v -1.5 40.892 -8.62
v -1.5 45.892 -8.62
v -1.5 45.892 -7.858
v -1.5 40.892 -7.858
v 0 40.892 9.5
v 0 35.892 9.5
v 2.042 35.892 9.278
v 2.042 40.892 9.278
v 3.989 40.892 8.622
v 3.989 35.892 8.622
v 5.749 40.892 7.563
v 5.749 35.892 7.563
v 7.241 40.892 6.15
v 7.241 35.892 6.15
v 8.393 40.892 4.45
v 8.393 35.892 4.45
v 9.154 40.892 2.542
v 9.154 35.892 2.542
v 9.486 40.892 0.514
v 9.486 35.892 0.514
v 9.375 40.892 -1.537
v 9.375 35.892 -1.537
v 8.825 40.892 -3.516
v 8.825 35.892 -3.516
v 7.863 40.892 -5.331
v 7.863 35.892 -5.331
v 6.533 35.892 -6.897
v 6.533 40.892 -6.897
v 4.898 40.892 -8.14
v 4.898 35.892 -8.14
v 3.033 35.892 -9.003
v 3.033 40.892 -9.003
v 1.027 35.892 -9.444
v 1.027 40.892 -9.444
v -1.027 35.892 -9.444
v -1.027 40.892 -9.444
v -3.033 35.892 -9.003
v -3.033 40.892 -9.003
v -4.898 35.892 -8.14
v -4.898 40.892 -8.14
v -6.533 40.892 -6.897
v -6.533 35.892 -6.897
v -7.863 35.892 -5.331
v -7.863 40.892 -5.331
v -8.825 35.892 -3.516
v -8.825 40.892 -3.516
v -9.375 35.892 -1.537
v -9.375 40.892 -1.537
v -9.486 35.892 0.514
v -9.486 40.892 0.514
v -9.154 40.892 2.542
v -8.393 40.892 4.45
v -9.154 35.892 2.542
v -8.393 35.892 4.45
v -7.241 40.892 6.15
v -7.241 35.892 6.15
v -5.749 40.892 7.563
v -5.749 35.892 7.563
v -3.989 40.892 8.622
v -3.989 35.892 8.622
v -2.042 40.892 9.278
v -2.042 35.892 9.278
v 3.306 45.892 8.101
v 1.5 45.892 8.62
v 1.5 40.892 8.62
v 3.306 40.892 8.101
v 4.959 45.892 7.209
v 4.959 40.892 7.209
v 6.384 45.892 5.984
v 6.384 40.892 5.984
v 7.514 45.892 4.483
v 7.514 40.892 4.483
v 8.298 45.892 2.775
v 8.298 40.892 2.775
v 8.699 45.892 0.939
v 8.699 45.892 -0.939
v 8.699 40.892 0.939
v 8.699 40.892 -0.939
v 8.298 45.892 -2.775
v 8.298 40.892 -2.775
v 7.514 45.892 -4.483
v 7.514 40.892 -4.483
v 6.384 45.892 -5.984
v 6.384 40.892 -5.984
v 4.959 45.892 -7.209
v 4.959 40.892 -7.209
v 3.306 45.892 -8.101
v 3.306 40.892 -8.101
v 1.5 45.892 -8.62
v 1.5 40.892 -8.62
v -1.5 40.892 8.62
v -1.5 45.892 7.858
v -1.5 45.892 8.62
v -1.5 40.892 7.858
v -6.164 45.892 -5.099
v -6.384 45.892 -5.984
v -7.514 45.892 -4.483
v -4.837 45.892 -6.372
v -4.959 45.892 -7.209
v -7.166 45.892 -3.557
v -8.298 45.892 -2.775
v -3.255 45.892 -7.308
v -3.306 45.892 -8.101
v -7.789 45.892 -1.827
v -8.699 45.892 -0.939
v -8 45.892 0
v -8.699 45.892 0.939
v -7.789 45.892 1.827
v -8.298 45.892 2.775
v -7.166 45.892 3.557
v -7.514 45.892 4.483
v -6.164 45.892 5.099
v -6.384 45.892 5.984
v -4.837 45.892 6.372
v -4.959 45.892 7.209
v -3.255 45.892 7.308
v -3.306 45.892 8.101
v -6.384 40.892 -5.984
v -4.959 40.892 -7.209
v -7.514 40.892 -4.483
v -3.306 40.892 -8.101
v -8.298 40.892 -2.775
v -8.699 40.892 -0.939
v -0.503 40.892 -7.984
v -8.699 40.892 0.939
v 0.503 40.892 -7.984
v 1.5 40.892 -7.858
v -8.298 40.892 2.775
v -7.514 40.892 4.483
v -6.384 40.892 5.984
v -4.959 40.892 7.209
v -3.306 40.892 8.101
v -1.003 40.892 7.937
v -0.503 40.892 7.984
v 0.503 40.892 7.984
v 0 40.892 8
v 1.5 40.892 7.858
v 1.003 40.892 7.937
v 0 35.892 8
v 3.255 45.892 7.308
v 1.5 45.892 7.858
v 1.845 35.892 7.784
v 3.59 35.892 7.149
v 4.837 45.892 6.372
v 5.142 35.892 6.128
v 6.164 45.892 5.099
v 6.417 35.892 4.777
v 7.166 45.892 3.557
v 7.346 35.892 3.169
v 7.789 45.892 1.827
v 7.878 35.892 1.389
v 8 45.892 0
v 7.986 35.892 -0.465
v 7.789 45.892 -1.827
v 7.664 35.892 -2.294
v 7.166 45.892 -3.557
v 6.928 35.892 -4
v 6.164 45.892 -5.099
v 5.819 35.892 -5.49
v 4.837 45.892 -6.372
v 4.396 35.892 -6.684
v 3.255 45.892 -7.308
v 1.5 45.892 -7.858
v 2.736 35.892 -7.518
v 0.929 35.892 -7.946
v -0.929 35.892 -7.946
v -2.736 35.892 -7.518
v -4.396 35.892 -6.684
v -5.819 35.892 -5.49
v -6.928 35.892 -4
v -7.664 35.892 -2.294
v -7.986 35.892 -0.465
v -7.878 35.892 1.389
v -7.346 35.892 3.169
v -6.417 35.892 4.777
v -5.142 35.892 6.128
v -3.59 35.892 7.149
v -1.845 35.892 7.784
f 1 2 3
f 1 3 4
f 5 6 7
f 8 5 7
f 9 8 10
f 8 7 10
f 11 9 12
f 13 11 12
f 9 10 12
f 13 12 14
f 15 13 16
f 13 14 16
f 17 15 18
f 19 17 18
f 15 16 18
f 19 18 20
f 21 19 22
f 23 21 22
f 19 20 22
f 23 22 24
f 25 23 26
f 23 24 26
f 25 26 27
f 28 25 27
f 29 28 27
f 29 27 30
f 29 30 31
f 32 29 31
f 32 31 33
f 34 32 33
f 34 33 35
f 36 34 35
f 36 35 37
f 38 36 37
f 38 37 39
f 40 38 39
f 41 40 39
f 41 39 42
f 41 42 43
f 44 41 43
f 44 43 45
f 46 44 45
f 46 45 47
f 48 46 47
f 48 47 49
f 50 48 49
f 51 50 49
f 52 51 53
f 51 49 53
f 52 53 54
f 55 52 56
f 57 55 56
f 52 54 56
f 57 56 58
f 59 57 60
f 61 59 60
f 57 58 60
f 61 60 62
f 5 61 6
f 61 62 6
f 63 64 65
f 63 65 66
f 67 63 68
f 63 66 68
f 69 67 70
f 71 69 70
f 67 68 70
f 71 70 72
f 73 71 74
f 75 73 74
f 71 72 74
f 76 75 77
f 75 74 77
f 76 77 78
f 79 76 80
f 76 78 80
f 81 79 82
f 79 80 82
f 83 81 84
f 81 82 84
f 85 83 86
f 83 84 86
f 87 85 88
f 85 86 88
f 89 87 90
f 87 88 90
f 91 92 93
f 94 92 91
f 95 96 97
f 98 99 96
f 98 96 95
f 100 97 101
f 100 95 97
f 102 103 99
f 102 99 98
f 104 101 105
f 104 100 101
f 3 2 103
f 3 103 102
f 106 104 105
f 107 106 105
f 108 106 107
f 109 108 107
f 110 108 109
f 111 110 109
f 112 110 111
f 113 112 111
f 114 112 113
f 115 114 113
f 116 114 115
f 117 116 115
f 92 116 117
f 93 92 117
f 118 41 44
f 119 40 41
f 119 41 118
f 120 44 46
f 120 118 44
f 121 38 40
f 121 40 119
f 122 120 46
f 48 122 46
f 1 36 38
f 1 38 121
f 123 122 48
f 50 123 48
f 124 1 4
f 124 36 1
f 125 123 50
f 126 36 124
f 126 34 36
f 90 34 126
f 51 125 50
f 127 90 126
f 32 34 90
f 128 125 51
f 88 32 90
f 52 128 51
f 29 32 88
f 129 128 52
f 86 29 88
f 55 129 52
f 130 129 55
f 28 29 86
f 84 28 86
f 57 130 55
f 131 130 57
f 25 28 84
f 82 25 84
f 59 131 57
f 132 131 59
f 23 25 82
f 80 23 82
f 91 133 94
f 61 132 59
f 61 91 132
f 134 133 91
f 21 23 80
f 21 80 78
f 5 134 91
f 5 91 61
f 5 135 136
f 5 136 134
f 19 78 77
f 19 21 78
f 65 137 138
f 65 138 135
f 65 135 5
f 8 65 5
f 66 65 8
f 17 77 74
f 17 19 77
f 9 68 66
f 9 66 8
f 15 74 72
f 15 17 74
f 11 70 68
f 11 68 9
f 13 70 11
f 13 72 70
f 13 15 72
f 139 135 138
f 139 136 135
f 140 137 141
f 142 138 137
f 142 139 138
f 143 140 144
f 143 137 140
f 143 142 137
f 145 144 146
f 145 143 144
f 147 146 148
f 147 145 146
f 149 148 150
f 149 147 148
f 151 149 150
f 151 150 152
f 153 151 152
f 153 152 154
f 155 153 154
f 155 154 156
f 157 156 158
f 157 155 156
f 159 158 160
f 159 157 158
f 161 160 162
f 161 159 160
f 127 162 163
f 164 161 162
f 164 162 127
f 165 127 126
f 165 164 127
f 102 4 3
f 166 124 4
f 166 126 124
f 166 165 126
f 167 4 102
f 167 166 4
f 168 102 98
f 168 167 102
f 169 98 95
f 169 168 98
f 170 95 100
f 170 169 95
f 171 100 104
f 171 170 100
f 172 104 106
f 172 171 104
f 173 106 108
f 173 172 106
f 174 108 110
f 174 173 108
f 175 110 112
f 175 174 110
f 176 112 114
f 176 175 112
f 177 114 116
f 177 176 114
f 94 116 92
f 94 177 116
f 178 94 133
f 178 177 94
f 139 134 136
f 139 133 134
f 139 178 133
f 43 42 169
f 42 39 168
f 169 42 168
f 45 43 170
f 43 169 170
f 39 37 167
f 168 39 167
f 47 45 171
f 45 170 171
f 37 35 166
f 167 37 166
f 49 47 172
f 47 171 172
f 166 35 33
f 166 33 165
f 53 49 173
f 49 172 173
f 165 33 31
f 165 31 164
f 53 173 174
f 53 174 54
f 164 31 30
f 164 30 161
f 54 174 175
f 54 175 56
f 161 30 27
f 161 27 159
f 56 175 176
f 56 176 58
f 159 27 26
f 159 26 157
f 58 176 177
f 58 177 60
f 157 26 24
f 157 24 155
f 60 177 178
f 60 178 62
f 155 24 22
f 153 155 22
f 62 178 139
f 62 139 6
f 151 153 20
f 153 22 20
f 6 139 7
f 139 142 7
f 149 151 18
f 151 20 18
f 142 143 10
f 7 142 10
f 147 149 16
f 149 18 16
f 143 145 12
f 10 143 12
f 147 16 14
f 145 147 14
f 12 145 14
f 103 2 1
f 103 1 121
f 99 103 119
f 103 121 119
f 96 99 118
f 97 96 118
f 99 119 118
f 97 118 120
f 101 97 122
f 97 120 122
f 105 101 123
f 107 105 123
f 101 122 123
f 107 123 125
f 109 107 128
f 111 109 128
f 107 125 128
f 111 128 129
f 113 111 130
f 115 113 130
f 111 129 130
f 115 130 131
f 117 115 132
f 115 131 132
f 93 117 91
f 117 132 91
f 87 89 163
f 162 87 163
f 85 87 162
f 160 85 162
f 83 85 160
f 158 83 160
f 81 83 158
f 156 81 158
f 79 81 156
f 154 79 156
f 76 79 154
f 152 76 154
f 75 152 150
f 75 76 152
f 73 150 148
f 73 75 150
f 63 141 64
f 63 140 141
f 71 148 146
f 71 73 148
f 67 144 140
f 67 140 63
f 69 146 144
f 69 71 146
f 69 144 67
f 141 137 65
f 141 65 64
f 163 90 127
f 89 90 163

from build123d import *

# Parameters (mm, degrees)
SKETCH1_R               = 95
SKETCH1_R_2             = 80
BOSS_EXTRUDE1_DEPTH     = 50
SKETCH2_R               = 87.5
SKETCH2_R_2             = 80
BOSS_EXTRUDE2_DEPTH     = 50
CUT_EXTRUDE1_DEPTH      = 168.481342244
CUT_EXTRUDE1_DEPTH_BACK = 168.481342244
SCALE1_SCALE            = 0.1


with BuildPart() as part:
    # Sketch1 → Boss-Extrude1 (new body)
    with BuildSketch(Plane(origin=(0, 0, 0), x_dir=(1, 0, 0), z_dir=(0, 1, 0))):
        with Locations(Location((0, 0, 0), (0, 0, 270))):
            Circle(SKETCH1_R)
        with Locations(Location((0, 0, 0), (0, 0, 270))):
            Circle(SKETCH1_R_2, mode=Mode.SUBTRACT)
    extrude(amount=BOSS_EXTRUDE1_DEPTH)

    # Sketch2 → Boss-Extrude2 (add)
    with BuildSketch(Plane(origin=(0, 50, 0), x_dir=(1, 0, 0), z_dir=(0, 1, 0))):
        with Locations(Location((0, 0, 0), (0, 0, 270))):
            Circle(SKETCH2_R)
        with Locations(Location((0, 0, 0), (0, 0, 270))):
            Circle(SKETCH2_R_2, mode=Mode.SUBTRACT)
    extrude(amount=BOSS_EXTRUDE2_DEPTH)

    # Sketch4 → Cut-Extrude1 (cut, two sides: drawn at the far end of the back side and taken through both)
    with BuildSketch(Plane.XY.offset(-CUT_EXTRUDE1_DEPTH_BACK)):
        Polygon((0, 100), (-15, 100), (-15, 50), (15, 50), (15, 100), align=None)
    extrude(amount=CUT_EXTRUDE1_DEPTH + CUT_EXTRUDE1_DEPTH_BACK, mode=Mode.SUBTRACT)


with BuildPart() as part_1:
    # Scale1: scaled about (0, 39.880423453, 0)
    add(part.part.scale(SCALE1_SCALE).moved(Location((0, 35.892381108, 0))))


solid = part_1.part
